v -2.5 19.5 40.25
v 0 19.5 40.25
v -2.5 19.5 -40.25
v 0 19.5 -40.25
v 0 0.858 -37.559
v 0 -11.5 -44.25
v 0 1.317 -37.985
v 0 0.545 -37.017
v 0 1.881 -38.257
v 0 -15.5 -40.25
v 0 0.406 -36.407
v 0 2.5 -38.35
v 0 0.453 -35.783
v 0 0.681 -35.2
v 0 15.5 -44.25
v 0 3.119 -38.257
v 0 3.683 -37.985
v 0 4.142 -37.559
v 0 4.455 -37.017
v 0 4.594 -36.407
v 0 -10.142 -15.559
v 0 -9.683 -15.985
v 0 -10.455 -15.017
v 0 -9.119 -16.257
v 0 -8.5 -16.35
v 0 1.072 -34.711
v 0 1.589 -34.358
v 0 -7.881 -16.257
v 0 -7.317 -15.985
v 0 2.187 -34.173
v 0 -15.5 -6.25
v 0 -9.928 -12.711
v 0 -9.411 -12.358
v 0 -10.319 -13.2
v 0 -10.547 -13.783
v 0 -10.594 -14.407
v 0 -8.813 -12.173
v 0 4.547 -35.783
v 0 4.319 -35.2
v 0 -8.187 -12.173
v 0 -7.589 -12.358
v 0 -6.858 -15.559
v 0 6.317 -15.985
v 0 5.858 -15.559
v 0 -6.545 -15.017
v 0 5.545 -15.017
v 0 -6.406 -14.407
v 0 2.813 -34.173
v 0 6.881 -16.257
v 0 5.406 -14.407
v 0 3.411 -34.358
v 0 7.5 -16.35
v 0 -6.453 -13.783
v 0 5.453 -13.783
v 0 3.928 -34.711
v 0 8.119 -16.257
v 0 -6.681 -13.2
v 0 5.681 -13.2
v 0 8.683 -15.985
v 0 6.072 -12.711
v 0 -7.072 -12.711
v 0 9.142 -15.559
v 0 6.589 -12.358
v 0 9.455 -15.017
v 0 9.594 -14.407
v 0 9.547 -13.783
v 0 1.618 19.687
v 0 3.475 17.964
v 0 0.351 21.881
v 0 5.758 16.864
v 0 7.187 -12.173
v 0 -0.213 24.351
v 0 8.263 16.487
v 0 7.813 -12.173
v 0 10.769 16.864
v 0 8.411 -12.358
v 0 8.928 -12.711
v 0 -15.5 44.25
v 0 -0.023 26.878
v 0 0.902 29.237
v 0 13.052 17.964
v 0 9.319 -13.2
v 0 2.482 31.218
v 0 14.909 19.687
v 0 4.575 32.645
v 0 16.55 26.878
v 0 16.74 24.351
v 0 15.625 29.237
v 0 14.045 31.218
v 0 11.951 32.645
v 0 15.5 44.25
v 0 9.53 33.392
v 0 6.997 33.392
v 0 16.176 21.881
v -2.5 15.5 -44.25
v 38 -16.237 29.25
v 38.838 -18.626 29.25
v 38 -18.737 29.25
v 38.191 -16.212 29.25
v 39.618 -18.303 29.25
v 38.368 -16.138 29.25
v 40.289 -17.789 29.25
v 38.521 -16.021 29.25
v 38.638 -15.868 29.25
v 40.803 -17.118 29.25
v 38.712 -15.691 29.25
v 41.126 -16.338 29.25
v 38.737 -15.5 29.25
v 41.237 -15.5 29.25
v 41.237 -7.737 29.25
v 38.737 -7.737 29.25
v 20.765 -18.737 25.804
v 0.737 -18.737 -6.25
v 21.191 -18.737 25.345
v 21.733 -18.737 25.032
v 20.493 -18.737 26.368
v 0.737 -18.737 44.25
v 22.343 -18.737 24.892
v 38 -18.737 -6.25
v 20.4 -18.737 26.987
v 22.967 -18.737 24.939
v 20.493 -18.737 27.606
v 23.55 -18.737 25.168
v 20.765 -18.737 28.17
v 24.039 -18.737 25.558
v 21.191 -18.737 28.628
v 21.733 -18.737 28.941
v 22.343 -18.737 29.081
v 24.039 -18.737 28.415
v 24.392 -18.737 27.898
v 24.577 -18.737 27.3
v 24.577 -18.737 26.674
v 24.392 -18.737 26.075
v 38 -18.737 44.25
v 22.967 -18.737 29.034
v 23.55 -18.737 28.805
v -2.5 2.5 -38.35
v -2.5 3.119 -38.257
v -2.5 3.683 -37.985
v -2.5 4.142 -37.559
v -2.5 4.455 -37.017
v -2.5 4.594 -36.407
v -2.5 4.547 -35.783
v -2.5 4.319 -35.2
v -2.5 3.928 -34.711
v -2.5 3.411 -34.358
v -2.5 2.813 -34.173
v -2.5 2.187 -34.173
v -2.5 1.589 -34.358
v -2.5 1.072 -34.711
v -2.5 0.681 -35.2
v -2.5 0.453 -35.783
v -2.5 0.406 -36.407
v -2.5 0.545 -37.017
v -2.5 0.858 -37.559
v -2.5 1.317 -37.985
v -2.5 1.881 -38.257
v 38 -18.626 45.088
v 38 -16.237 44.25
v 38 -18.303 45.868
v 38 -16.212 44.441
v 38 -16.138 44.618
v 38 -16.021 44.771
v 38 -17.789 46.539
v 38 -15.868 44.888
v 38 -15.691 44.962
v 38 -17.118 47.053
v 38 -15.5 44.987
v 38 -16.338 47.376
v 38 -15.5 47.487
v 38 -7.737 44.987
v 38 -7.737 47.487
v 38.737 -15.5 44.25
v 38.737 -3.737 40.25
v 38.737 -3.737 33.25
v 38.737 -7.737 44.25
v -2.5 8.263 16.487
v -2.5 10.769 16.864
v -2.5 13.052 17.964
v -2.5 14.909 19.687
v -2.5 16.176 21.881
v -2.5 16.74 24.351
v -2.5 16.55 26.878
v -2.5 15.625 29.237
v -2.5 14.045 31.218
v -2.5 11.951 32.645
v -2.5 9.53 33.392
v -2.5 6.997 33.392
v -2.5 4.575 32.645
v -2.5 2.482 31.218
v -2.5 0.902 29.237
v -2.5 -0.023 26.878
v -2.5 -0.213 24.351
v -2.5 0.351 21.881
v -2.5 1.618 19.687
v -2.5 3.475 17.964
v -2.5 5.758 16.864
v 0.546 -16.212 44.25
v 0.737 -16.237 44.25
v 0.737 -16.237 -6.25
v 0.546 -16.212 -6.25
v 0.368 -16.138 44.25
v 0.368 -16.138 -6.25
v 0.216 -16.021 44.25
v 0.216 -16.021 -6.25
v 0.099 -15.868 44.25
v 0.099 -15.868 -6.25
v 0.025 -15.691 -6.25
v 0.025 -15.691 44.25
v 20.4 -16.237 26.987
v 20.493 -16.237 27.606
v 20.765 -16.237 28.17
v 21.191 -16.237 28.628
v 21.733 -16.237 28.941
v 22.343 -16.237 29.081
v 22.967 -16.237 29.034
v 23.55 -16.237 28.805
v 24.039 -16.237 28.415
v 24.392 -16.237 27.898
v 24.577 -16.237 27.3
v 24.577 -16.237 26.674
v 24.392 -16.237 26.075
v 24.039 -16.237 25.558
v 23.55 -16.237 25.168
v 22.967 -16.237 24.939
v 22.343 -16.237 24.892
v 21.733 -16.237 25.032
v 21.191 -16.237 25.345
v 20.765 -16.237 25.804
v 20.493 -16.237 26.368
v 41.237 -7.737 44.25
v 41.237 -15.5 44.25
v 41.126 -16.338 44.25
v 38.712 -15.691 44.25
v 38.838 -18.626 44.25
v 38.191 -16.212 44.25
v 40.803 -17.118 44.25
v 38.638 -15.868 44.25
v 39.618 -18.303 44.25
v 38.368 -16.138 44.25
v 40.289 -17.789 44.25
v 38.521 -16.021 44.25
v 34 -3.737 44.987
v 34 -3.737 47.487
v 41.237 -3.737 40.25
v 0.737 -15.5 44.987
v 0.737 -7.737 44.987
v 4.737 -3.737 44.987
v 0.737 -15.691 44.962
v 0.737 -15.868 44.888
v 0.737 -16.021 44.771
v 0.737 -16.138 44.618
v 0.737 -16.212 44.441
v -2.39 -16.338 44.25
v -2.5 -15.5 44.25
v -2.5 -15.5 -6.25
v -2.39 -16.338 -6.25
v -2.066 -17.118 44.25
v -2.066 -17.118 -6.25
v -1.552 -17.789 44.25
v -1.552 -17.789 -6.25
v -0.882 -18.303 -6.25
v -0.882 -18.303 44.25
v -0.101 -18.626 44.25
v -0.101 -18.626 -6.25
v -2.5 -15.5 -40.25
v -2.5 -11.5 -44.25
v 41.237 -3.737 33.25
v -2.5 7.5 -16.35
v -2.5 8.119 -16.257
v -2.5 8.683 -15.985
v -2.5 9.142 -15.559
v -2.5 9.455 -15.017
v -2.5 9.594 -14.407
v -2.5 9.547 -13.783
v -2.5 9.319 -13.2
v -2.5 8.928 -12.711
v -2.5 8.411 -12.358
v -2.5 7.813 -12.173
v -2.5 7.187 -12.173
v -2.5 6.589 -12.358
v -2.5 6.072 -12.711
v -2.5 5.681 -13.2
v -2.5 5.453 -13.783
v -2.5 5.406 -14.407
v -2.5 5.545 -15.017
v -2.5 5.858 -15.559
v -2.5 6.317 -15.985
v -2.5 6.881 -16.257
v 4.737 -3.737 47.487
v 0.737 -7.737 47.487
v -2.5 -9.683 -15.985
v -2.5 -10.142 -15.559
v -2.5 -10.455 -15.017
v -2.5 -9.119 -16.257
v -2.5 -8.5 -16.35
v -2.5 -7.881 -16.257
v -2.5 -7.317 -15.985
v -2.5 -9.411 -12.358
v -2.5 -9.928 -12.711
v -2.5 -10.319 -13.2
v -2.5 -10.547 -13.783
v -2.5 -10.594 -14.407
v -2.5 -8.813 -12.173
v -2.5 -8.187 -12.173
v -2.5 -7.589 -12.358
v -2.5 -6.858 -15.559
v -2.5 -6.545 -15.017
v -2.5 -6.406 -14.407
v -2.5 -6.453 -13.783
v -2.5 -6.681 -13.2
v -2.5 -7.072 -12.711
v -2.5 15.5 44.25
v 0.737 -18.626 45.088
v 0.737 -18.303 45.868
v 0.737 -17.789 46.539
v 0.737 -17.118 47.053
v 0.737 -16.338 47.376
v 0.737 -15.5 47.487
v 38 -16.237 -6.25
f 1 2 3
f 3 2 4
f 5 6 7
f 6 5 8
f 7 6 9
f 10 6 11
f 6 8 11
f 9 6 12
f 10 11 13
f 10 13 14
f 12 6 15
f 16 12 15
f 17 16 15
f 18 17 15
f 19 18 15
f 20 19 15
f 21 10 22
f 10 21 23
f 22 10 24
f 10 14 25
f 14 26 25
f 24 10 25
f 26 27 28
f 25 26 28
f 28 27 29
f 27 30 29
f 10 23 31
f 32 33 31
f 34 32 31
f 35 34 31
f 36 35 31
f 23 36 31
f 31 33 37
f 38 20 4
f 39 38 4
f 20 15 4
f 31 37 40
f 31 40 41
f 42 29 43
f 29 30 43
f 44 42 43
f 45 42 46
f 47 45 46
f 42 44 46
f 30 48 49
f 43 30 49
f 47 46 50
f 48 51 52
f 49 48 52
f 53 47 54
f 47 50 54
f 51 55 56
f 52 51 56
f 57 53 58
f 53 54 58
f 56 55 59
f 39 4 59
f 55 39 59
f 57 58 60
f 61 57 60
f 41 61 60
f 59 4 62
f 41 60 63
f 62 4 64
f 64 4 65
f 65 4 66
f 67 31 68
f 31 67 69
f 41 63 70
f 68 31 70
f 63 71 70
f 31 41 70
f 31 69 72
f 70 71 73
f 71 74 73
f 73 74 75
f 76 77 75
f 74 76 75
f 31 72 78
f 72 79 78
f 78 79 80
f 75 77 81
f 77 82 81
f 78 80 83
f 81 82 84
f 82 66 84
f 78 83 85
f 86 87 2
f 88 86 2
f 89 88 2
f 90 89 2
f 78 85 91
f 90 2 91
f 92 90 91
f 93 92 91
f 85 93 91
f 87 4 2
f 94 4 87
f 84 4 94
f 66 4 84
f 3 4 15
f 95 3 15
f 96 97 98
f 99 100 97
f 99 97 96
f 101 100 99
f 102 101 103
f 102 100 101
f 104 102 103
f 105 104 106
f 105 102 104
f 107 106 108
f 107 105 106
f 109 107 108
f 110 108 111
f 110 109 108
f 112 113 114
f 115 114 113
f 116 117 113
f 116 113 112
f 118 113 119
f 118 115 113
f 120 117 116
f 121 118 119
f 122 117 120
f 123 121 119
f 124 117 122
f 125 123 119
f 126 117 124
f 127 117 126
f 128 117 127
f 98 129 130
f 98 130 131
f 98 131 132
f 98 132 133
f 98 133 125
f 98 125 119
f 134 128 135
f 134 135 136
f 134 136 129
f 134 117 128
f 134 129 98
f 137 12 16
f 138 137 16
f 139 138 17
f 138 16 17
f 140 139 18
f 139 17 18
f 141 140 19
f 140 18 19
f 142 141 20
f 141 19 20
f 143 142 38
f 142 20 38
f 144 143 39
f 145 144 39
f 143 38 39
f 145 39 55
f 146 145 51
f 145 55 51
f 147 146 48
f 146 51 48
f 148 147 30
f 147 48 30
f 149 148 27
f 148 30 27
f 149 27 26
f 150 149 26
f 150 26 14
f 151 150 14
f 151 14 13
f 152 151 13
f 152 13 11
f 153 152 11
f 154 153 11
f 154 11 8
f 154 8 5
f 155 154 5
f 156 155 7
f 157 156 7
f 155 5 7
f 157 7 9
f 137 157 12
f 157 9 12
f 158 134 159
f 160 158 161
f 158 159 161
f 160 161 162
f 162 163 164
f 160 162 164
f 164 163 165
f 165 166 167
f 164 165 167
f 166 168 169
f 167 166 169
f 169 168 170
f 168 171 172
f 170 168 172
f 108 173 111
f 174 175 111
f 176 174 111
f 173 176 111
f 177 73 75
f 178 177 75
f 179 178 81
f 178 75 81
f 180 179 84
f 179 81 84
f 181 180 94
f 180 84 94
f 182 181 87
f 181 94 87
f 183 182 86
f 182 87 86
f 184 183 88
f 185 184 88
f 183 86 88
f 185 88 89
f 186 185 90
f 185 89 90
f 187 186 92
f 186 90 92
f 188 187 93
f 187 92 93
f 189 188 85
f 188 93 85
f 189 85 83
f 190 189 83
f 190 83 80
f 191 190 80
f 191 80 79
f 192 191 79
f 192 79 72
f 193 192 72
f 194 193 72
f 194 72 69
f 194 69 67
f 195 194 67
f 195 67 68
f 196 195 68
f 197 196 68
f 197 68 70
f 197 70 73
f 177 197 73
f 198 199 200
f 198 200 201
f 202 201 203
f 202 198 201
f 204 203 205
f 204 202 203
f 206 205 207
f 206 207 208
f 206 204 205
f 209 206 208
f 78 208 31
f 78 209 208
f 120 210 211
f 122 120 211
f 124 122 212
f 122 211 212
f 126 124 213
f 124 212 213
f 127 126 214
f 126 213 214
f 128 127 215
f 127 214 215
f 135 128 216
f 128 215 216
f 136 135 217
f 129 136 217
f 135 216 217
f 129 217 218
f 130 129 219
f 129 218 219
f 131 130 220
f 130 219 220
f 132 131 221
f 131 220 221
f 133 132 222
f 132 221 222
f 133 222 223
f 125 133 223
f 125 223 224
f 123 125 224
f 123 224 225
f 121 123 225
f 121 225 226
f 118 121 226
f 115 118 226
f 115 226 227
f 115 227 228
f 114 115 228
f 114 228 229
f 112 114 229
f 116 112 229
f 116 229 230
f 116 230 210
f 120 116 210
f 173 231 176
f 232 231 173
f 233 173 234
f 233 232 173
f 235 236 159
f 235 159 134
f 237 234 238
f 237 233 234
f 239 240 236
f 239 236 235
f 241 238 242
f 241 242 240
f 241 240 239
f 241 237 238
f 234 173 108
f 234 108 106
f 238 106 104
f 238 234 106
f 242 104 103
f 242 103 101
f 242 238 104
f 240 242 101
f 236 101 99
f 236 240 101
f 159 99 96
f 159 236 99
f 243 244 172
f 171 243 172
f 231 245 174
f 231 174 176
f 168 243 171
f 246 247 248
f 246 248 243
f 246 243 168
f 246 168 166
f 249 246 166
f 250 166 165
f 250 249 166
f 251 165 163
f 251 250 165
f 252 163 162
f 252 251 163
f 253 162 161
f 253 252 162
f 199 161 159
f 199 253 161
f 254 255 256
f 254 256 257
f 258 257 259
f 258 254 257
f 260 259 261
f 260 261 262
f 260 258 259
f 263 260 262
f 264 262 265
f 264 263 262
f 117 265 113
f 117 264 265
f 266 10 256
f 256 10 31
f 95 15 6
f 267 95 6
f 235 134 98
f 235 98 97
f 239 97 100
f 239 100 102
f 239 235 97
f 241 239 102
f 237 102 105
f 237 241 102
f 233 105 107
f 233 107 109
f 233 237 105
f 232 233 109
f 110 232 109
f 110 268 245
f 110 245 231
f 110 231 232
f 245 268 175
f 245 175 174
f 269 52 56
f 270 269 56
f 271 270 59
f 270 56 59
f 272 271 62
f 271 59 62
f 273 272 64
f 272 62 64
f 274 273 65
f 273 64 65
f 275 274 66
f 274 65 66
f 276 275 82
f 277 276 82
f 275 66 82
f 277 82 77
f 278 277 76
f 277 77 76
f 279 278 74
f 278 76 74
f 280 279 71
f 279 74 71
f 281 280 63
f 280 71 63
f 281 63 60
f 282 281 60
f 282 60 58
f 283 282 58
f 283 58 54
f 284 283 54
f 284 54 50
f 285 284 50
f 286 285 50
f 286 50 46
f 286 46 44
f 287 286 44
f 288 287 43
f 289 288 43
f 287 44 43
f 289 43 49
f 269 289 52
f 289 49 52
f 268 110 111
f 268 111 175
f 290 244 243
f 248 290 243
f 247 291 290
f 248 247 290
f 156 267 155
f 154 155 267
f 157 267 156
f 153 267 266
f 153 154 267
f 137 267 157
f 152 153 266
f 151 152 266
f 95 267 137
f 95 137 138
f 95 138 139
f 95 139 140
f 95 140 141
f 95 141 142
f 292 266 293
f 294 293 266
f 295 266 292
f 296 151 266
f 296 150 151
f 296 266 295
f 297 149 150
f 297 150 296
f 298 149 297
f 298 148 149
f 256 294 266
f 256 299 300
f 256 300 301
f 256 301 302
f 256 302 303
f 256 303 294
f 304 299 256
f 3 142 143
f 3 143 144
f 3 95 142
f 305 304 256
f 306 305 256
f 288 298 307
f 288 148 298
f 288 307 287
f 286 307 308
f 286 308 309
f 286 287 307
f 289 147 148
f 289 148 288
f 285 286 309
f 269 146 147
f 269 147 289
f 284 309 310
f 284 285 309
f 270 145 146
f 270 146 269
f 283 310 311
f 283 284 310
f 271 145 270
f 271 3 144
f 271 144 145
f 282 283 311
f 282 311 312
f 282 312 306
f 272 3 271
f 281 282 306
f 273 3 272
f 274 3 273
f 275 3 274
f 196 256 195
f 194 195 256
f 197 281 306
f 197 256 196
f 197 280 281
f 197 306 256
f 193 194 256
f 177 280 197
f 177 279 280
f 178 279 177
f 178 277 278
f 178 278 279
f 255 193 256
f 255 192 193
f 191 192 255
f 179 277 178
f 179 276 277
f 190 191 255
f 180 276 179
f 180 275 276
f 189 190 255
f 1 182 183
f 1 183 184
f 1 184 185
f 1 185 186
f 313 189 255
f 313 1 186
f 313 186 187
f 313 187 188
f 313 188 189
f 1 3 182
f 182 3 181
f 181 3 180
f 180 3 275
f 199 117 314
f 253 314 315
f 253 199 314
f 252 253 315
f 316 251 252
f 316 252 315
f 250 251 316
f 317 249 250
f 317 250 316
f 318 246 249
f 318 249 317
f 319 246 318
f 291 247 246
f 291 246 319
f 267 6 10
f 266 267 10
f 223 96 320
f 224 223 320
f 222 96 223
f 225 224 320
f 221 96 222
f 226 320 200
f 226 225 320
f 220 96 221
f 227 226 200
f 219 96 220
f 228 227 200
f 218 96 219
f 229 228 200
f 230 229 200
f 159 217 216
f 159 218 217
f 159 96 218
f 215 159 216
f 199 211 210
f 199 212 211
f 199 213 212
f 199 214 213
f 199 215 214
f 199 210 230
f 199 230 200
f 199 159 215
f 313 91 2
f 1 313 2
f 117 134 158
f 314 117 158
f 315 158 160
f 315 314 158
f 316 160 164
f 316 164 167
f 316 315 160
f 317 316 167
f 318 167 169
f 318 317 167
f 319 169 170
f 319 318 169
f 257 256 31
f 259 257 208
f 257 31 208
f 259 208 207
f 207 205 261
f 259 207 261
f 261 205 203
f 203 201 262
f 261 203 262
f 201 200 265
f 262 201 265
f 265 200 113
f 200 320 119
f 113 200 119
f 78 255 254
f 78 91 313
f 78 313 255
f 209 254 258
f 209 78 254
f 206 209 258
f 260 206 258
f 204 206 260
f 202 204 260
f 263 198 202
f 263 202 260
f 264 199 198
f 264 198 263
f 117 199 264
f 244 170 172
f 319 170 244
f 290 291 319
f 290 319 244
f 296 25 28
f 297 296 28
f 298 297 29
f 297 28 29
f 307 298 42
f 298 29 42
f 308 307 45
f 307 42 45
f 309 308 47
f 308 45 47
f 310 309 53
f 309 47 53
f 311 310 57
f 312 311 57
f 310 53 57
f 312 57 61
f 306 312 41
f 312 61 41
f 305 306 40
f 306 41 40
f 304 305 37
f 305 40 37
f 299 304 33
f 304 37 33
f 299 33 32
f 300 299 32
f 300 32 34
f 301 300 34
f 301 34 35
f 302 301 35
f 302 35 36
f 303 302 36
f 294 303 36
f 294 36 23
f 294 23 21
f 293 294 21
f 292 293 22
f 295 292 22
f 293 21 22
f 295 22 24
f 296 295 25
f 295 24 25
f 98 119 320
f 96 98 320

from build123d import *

# Parameters (mm, degrees)
SKETCH1_R               = 2.1
BASE_FLANGE1_DEPTH      = 2.5
EDGE_FLANGE1_DEPTH      = 50.5
EDGE_FLANGE2_DEPTH      = 15
EDGE_FLANGE2_START      = 2.5
EDGE_FLANGE2_FLAT_DEPTH = 2.5
EDGE_FLANGE3_DEPTH      = 37.2634
CUT_EXTRUDE1_DEPTH      = 103.451505402
SKETCH18_R              = 8.5
CUT_EXTRUDE2_DEPTH      = 66.845913762
SKETCH19_R              = 2.1
CUT_EXTRUDE3_DEPTH      = 73.336290606


# Sheet-metal steps are written as plain solids
with BuildPart() as part:
    # Sketch1 → Base-Flange1 (new body)
    with BuildSketch(Plane(origin=(0, 0, 0), x_dir=(0, 0, -1), z_dir=(1, 0, 0))):
        Polygon((40.25, 19.5), (44.25, 15.5), (44.25, -11.5), (40.25, -15.5), (-44.25, -15.5), (-44.25, 15.5), (-40.25, 19.5), align=None)
        with Locations((14.25, 7.5)):
            Circle(SKETCH1_R, mode=Mode.SUBTRACT)
        with Locations((14.25, -8.5)):
            Circle(SKETCH1_R, mode=Mode.SUBTRACT)
        with Locations((36.25, 2.5)):
            Circle(SKETCH1_R, mode=Mode.SUBTRACT)
    extrude(amount=-BASE_FLANGE1_DEPTH)

    # Edge-Flange1 section (across the edge) → Edge-Flange1 (add)
    with BuildSketch(Plane(origin=(0, -16.2366, 44.25), x_dir=(0, 1, 0), z_dir=(0, 0, -1))):
        with BuildLine():
            Line((-2.5, 0.7366), (-2.5, 38))
            Line((-2.5, 38), (0, 38))
            Line((0, 38), (0, 0.7366))
            ThreePointArc((0, 0.7366), (0.215745145, 0.215745145), (0.7366, 0))
            Line((0.7366, 0), (0.7366, -2.5))
            ThreePointArc((0.7366, -2.5), (-1.552021808, -1.552021808), (-2.5, 0.7366))
        make_face()
    extrude(amount=EDGE_FLANGE1_DEPTH)

    # Edge-Flange2 bend section (across the edge) → Edge-Flange2 (add)
    with BuildSketch(Plane(origin=(38.7366, -16.2366, 44.25), x_dir=(-1, 0, 0), z_dir=(0, 0, -1))):
        with BuildLine():
            Line((-2.5, 0.7366), (0, 0.7366))
            ThreePointArc((0, 0.7366), (0.215745145, 0.215745145), (0.7366, 0))
            Line((0.7366, 0), (0.7366, -2.5))
            ThreePointArc((0.7366, -2.5), (-1.552021808, -1.552021808), (-2.5, 0.7366))
        make_face()
    extrude(amount=EDGE_FLANGE2_DEPTH)

    # Edge-Flange2 profile (on flange) → Edge-Flange2 flat (add)
    with BuildSketch(Plane(origin=(38.7366, -16.2366, 0), x_dir=(0, 0, -1), z_dir=(1, 0, 0)).offset(EDGE_FLANGE2_START)):
        Polygon((-44.25, 0.7366), (-29.25, 0.7366), (-29.25, 8.5), (-33.25, 12.5), (-40.25, 12.5), (-44.25, 8.5), align=None)
    extrude(amount=-EDGE_FLANGE2_FLAT_DEPTH)

    # Edge-Flange3 section (across the edge) → Edge-Flange3 (add)
    with BuildSketch(Plane(origin=(0.7366, -16.2366, 44.9866), x_dir=(0, 0, -1), z_dir=(1, 0, 0))):
        with BuildLine():
            Line((-2.5, 0.7366), (-2.5, 12.5))
            Line((-2.5, 12.5), (0, 12.5))
            Line((0, 12.5), (0, 0.7366))
            ThreePointArc((0, 0.7366), (0.215745145, 0.215745145), (0.7366, 0))
            Line((0.7366, 0), (0.7366, -2.5))
            ThreePointArc((0.7366, -2.5), (-1.552021808, -1.552021808), (-2.5, 0.7366))
        make_face()
    extrude(amount=EDGE_FLANGE3_DEPTH)

    # Sketch17 → Cut-Extrude1 (cut, through all)
    with BuildSketch(Plane.XY.offset(47.4866)):
        Polygon((0.7366, -7.7366), (4.7366, -3.7366), (0.7366, -3.7366), align=None)
        Polygon((34, -3.7366), (38, -7.7366), (38, -3.7366), align=None)
    extrude(amount=-CUT_EXTRUDE1_DEPTH, mode=Mode.SUBTRACT)

    # Sketch18 → Cut-Extrude2 (cut, through all)
    with BuildSketch(Plane(origin=(0, 0, 0), x_dir=(0, 0, -1), z_dir=(1, 0, 0))):
        with Locations((-24.9866, 8.2634)):
            Circle(SKETCH18_R)
    extrude(amount=-CUT_EXTRUDE2_DEPTH, mode=Mode.SUBTRACT)

    # Sketch19 → Cut-Extrude3 (cut, through all)
    with BuildSketch(Plane(origin=(0, -16.2366, 0), x_dir=(1, 0, 0), z_dir=(0, 1, 0))):
        with Locations(Location((22.5, -26.9866, 0), (0, 0, 180))):
            Circle(SKETCH19_R)
    extrude(amount=-CUT_EXTRUDE3_DEPTH, mode=Mode.SUBTRACT)


solid = part.part
